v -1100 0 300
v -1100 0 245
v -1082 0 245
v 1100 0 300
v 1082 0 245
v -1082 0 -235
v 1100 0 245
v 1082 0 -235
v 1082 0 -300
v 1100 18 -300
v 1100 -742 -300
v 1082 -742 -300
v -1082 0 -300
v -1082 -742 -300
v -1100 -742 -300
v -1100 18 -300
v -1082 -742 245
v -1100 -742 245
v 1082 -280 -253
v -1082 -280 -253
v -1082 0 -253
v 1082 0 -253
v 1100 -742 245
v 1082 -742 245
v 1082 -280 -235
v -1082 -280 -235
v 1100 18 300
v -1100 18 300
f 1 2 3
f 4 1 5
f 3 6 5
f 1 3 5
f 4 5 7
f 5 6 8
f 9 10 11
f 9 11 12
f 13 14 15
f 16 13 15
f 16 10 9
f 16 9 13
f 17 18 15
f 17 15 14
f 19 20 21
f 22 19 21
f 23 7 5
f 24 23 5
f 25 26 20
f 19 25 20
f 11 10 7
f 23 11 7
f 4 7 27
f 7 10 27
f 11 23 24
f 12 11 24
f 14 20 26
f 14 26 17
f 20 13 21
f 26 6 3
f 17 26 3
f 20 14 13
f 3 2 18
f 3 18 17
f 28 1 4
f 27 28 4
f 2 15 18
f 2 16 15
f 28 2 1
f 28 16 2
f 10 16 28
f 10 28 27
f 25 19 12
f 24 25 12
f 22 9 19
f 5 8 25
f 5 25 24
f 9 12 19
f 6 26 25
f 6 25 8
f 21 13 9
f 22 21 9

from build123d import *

# Parameters (mm, degrees)
SKETCH1_W           = 2200
SKETCH1_H           = 600
BOSS_EXTRUDE1_DEPTH = 18
SKETCH2_W           = 18
SKETCH2_H           = 545
BOSS_EXTRUDE2_DEPTH = 742
SKETCH3_W           = 18
SKETCH3_H           = 280
BOSS_EXTRUDE3_DEPTH = 2164


with BuildPart() as part:
    # Sketch1 → Boss-Extrude1 (new body)
    with BuildSketch(Plane(origin=(0, 0, 0), x_dir=(1, 0, 0), z_dir=(0, 1, 0))):
        Rectangle(SKETCH1_W, SKETCH1_H)
    extrude(amount=BOSS_EXTRUDE1_DEPTH)

    # Sketch2 → Boss-Extrude2 (add)
    with BuildSketch(Plane.XZ):
        with Locations((-1091, -27.5)):
            Rectangle(SKETCH2_W, SKETCH2_H)
    boss_extrude2 = extrude(amount=BOSS_EXTRUDE2_DEPTH)

    # Mirror1: Boss-Extrude2 across plane
    add(boss_extrude2.mirror(Plane(origin=(0, 0, 0), x_dir=(0, 0, 1), z_dir=(1, 0, 0))))

    # Sketch3 → Boss-Extrude3 (add)
    with BuildSketch(Plane(origin=(-1082, 0, 0), x_dir=(0, 0, -1), z_dir=(1, 0, 0))):
        with Locations((244, -140)):
            Rectangle(SKETCH3_W, SKETCH3_H)
    extrude(amount=BOSS_EXTRUDE3_DEPTH)


solid = part.part
